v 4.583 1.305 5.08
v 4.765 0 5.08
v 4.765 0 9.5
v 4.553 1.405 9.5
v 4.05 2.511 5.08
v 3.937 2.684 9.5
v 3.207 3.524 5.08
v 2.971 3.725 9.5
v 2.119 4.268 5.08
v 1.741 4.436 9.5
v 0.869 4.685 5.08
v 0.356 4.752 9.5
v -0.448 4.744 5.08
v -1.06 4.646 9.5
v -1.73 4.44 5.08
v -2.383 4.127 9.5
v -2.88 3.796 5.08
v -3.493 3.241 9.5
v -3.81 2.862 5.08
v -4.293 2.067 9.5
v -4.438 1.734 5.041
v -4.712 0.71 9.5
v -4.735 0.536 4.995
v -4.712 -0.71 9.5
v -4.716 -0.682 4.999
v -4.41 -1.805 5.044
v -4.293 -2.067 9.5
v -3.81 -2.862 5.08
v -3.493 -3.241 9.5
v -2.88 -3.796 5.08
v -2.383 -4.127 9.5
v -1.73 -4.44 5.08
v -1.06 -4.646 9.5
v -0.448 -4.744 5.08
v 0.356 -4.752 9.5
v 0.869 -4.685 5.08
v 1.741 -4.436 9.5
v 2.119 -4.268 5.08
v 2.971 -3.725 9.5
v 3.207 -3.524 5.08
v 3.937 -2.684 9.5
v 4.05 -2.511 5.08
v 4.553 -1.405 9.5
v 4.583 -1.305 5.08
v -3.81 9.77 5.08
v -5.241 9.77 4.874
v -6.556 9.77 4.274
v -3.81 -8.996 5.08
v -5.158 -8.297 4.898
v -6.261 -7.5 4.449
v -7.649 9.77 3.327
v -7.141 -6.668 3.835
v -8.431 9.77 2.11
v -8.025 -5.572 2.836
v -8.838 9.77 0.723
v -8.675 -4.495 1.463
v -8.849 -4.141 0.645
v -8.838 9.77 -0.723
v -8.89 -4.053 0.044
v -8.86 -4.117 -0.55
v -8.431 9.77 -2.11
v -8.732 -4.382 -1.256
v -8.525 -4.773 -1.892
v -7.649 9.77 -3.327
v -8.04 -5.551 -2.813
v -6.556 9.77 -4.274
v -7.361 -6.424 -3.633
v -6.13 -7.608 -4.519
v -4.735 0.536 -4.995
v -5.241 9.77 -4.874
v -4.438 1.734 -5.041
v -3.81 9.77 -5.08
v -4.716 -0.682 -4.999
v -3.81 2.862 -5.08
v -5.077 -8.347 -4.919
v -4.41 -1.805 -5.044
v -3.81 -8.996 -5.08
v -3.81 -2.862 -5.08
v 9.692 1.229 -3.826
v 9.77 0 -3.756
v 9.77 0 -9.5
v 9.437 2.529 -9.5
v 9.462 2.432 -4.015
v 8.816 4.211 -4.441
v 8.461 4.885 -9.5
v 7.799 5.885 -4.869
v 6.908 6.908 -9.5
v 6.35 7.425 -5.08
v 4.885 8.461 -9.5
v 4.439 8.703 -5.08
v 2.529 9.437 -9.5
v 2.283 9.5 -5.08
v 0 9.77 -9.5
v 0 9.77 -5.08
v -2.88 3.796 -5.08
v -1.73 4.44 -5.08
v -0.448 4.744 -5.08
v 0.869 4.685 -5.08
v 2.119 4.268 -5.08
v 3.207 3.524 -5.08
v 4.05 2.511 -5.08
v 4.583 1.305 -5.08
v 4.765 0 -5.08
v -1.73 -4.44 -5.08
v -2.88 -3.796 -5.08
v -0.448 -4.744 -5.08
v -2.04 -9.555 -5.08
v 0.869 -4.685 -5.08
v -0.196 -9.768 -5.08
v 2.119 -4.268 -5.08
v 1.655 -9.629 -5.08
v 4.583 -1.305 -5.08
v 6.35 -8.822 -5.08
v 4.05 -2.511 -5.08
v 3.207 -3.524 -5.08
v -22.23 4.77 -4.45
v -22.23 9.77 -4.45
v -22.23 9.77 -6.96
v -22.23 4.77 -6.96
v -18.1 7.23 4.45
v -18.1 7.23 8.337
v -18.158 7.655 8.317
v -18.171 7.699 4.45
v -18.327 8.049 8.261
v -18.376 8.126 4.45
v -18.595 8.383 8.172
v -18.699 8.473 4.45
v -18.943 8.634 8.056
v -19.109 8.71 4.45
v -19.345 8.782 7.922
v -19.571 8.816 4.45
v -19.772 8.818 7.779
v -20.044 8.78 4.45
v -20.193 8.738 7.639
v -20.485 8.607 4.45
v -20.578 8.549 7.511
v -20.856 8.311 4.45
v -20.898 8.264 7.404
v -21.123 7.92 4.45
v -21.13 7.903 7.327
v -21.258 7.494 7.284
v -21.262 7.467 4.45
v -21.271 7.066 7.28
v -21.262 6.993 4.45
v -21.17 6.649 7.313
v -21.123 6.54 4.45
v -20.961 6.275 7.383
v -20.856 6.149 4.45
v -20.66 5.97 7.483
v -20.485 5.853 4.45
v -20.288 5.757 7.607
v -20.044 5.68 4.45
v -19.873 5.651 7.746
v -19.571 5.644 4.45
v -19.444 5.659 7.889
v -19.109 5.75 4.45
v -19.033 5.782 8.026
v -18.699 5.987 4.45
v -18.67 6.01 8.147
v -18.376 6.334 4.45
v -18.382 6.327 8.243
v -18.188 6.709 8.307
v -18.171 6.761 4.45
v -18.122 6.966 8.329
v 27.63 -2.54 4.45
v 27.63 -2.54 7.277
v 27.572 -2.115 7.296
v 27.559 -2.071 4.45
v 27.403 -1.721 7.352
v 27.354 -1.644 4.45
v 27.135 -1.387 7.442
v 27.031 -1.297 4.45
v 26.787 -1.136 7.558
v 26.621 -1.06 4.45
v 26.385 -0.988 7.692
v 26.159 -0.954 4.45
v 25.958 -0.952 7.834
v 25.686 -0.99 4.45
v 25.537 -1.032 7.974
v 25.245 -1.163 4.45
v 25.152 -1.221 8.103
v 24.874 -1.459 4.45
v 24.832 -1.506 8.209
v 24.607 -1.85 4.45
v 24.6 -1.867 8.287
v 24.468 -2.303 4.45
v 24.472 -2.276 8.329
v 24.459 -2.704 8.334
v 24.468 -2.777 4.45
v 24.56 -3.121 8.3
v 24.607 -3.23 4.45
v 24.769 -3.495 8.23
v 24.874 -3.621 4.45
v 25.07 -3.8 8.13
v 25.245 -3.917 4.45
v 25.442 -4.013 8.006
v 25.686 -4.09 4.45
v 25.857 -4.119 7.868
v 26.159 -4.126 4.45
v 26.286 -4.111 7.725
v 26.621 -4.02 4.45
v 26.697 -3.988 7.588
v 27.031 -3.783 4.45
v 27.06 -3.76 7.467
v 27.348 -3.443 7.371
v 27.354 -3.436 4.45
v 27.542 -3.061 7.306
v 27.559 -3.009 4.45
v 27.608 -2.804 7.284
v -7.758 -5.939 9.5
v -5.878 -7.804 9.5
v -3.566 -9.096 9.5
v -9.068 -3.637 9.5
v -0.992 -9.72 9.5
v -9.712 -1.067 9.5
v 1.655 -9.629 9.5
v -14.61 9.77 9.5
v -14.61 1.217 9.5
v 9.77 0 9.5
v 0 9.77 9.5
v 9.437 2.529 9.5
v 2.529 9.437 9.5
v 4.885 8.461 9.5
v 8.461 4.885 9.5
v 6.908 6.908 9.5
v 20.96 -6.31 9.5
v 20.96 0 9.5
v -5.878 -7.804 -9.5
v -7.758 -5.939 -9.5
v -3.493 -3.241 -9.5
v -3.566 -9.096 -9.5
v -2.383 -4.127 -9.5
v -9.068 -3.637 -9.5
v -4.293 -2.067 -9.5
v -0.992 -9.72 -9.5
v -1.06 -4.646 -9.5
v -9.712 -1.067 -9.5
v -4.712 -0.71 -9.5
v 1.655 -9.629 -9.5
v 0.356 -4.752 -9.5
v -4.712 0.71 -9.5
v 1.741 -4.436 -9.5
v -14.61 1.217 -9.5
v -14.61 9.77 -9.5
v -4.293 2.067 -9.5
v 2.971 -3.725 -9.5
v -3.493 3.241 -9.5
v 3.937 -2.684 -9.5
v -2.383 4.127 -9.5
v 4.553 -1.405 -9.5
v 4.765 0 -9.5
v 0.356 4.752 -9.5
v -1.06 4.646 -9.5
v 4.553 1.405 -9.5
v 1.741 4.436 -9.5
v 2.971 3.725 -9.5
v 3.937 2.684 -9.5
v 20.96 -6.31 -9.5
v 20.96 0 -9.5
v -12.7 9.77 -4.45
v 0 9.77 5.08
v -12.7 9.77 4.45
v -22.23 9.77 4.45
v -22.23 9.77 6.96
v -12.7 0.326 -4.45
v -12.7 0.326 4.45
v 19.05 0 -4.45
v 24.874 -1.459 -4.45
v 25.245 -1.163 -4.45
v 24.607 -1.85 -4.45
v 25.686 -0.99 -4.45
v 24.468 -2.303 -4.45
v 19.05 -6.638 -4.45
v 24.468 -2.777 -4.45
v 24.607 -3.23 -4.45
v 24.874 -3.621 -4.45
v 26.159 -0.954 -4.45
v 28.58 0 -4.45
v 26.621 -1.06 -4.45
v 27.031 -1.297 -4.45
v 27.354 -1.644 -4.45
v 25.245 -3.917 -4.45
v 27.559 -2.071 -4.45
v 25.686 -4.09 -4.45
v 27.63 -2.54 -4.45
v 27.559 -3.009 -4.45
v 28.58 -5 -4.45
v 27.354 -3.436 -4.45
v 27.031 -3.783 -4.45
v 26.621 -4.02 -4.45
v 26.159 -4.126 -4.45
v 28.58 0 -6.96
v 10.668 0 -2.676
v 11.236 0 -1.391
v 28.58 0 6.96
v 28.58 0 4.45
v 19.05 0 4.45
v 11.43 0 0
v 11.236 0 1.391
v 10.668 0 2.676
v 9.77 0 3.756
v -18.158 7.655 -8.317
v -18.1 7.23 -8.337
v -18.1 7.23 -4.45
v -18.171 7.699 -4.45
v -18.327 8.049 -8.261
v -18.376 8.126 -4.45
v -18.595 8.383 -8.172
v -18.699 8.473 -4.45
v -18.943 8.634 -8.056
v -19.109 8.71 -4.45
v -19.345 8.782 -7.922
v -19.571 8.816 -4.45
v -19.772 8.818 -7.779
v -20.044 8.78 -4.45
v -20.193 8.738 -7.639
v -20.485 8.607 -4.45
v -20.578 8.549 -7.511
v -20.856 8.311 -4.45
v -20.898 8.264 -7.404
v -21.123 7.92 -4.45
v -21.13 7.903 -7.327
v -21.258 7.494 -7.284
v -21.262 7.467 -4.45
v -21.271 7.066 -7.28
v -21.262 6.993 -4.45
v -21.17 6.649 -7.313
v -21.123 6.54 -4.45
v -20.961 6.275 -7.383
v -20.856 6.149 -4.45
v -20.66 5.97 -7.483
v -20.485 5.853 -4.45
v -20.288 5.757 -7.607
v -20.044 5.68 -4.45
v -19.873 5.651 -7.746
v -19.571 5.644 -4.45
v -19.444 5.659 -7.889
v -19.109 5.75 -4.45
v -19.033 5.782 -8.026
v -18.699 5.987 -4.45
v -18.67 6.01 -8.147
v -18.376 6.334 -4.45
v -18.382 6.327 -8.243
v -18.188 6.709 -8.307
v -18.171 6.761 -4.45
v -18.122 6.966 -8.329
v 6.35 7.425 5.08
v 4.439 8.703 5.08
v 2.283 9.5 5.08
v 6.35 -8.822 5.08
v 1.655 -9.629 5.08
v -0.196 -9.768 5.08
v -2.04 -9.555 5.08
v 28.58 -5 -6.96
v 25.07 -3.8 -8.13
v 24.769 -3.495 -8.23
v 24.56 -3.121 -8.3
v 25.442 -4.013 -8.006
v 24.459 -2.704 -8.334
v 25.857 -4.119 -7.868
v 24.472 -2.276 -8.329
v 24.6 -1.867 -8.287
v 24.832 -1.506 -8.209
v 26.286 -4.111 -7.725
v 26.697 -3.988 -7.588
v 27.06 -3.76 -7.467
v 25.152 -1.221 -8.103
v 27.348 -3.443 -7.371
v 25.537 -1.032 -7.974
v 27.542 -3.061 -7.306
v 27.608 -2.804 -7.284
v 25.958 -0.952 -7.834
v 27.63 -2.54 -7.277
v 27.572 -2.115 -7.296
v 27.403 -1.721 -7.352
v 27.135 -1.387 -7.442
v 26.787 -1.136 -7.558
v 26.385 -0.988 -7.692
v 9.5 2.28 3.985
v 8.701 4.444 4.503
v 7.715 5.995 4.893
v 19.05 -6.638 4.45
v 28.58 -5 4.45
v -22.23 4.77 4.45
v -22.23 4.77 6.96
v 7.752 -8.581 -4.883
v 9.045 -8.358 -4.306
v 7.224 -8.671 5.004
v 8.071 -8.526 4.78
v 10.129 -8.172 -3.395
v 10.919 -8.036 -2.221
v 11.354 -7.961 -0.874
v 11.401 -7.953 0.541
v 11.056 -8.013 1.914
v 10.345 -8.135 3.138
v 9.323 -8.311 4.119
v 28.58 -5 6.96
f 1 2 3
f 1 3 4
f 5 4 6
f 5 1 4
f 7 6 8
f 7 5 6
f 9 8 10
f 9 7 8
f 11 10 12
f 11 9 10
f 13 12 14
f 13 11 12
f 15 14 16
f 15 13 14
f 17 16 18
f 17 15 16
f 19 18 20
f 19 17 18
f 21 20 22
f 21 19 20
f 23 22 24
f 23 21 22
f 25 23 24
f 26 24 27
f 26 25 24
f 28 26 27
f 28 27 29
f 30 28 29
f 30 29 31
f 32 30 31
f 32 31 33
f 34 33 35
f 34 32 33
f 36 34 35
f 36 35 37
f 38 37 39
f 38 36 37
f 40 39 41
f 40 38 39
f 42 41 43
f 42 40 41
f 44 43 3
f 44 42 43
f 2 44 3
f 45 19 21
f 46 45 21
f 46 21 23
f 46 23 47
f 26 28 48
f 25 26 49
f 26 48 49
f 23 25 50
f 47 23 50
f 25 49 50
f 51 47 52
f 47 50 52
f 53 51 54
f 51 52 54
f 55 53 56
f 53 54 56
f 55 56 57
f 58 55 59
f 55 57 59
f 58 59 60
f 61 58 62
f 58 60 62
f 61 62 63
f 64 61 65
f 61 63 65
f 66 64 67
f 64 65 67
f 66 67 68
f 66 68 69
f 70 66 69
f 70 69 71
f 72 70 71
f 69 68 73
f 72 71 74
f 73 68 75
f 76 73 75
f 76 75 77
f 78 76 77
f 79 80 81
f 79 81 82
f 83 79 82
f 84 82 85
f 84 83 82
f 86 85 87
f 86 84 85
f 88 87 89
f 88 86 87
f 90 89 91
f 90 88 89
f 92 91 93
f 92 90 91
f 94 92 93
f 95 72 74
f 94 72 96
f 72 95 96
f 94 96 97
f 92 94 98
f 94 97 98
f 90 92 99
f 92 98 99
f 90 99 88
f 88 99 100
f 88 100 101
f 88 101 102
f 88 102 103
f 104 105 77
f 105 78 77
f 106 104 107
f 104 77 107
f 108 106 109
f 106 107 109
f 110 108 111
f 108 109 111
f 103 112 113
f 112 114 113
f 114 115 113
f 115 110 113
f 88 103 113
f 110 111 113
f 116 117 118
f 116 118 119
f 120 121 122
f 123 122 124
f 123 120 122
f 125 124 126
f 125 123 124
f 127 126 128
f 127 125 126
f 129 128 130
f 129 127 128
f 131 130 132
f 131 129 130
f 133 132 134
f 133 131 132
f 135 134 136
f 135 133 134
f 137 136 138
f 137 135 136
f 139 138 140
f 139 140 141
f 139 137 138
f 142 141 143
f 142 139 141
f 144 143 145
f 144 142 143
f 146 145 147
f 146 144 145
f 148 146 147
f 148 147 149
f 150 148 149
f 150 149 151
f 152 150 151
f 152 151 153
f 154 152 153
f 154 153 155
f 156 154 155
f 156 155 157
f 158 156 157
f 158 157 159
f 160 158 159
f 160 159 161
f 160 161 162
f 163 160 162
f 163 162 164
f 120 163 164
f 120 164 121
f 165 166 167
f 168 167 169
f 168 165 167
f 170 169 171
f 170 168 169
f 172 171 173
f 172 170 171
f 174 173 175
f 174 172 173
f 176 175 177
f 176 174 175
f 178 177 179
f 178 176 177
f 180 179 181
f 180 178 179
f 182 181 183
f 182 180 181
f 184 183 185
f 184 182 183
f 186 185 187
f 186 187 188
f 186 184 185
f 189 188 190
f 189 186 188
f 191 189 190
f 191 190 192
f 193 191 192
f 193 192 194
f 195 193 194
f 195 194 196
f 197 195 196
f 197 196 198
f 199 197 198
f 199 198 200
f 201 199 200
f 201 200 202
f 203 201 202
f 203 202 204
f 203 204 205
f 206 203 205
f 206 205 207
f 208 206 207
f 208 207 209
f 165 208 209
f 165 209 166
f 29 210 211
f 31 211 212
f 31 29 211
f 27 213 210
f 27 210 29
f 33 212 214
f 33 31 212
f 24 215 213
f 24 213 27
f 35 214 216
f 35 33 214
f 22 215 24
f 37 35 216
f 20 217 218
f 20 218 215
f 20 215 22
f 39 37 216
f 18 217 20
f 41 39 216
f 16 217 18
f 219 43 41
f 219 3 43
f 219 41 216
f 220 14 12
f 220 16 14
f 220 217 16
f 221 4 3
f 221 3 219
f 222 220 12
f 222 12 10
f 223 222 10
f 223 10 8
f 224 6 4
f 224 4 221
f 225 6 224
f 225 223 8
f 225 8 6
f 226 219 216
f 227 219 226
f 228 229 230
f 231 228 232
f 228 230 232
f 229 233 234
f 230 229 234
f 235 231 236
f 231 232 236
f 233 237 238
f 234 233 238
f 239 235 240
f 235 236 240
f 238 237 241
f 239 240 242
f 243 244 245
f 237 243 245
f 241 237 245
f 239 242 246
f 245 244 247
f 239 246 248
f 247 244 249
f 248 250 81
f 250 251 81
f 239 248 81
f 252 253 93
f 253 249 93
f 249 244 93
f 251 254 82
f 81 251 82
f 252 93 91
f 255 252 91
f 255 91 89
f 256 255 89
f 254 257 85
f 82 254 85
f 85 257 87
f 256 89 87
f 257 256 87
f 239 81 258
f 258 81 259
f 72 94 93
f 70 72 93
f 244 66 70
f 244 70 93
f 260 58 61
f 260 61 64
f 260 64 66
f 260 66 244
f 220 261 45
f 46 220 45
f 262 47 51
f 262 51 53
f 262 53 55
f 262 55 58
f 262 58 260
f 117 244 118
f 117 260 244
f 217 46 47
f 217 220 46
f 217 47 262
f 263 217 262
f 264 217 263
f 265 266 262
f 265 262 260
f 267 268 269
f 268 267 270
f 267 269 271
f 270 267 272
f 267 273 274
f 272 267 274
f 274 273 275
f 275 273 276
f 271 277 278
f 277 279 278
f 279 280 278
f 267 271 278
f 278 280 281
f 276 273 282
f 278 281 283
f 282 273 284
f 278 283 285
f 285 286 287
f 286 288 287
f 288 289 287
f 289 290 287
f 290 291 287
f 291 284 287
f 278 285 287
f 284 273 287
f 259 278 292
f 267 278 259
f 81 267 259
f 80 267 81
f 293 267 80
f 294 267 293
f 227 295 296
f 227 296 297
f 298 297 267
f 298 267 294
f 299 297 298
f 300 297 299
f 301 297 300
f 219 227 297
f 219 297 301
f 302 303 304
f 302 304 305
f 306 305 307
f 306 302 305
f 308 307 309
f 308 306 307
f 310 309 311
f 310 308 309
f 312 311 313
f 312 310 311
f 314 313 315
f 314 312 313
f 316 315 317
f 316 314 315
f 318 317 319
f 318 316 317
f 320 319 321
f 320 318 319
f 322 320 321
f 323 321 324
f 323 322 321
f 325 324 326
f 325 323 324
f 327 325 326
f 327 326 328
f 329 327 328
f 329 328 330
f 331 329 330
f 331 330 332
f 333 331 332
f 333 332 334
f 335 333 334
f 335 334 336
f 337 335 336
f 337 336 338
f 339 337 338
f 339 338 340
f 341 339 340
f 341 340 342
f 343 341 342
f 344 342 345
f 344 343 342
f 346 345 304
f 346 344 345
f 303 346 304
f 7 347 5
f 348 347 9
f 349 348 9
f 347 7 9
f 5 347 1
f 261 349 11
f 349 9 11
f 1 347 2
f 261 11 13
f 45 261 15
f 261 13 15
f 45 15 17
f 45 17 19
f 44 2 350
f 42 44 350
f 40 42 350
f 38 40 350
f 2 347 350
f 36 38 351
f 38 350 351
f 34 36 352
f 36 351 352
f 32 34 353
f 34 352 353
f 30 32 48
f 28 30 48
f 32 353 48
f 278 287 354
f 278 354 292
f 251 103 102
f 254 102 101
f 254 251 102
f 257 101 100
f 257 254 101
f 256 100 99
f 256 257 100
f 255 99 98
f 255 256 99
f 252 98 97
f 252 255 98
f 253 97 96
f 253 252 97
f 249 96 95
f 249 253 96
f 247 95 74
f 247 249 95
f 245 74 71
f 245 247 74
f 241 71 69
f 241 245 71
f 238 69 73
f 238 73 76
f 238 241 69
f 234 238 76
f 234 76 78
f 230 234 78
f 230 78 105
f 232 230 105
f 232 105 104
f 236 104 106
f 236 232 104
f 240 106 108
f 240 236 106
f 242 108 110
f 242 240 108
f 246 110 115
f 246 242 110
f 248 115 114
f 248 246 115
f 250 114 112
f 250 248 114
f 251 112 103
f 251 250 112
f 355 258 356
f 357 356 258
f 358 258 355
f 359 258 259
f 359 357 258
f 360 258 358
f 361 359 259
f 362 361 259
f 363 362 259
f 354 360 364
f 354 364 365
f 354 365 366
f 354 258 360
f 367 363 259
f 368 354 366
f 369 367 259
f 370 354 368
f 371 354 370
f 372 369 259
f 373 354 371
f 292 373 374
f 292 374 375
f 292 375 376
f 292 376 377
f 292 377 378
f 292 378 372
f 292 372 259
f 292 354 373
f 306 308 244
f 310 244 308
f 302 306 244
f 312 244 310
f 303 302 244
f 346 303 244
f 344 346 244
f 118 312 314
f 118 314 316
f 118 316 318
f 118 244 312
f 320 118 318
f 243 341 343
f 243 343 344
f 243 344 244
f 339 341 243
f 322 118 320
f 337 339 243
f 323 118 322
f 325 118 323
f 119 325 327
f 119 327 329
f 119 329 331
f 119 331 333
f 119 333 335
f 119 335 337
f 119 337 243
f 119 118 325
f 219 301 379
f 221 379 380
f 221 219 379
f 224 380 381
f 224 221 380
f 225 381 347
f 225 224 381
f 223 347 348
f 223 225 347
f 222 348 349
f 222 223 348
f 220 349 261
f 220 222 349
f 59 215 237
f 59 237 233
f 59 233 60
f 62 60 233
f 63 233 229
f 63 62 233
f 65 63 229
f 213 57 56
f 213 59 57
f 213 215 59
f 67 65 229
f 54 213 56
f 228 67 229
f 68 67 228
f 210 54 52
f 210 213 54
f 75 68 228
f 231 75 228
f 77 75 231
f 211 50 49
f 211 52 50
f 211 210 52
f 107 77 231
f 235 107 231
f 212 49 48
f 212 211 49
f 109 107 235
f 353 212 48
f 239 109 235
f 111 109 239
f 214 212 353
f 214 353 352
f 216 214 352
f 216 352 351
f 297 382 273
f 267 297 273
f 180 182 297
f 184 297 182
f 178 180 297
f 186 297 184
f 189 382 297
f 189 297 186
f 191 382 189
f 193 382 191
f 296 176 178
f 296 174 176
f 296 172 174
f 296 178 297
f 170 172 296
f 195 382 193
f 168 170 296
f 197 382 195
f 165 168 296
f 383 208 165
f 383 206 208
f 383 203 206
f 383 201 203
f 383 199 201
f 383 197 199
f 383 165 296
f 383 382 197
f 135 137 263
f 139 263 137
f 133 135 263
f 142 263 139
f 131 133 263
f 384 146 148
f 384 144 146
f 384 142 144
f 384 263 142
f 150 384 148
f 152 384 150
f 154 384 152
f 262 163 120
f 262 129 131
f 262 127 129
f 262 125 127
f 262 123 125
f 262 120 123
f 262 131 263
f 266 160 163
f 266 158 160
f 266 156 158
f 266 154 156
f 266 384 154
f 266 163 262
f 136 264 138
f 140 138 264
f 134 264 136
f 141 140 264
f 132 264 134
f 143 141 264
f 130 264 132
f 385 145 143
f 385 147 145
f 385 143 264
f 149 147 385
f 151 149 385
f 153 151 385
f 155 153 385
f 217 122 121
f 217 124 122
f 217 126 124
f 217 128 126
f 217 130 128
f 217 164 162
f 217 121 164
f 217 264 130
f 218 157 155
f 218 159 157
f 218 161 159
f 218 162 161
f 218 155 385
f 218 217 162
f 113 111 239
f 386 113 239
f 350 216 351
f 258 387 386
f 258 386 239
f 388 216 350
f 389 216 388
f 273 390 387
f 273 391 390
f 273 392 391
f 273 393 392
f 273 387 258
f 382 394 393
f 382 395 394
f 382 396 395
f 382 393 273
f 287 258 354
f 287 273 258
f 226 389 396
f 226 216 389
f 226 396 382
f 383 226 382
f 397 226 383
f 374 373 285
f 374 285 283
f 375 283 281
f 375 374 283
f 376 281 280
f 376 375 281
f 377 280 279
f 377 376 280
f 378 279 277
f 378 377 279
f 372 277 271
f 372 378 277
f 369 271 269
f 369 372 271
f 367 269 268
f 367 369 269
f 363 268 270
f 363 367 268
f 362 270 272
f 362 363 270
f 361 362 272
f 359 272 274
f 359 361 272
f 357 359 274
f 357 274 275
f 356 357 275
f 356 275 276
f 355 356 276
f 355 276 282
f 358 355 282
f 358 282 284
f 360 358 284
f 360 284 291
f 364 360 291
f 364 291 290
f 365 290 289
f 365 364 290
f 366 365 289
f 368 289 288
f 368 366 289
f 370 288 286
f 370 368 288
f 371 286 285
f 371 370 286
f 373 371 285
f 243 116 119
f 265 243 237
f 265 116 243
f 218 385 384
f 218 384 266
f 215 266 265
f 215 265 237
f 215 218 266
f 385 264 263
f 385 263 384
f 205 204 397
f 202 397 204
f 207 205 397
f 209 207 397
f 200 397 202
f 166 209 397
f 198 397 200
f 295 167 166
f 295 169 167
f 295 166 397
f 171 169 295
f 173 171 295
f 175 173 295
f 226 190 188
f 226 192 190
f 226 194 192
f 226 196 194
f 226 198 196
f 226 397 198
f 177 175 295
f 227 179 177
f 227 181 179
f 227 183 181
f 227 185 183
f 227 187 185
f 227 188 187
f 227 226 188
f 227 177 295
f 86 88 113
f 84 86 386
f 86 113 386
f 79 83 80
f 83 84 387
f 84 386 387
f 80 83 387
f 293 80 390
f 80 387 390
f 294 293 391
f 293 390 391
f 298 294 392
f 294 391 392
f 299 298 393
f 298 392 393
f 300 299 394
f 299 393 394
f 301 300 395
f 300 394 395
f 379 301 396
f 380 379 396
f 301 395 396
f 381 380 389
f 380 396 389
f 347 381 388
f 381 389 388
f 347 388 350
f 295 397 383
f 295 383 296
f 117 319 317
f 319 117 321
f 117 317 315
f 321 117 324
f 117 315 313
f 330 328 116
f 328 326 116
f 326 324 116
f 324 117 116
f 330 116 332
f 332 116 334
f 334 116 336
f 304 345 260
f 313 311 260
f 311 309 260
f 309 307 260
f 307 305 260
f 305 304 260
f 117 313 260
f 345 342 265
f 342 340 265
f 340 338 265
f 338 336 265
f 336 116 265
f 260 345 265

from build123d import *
from OCP.BRepFilletAPI import BRepFilletAPI_MakeChamfer

# Parameters (mm, degrees)
SKETCH1_R               = 4.765
BOSS_EXTRUDE1_DEPTH     = 9.5
CHAMFER1_SIZE           = 7.62
CHAMFER1_SIZE2          = 2.54
CHAMFER2_SIZE           = 2.54
CHAMFER2_SIZE2          = 7.62
CUT_EXTRUDE1_DEPTH      = 32.662585176
CUT_EXTRUDE1_DEPTH_BACK = 32.662585176
SKETCH2_W               = 9.53
SKETCH2_H               = 8.9
CUT_EXTRUDE2_DEPTH      = 32.662585176
CUT_EXTRUDE2_DEPTH_BACK = 32.662585176
CUT_EXTRUDE3_DEPTH      = 32.662585236
CUT_EXTRUDE3_DEPTH_BACK = 32.662585236
SKETCH4_R               = 1.59


with BuildPart() as part:
    # Sketch1 → Boss-Extrude1 (new, symmetric)
    with BuildSketch(Plane.XY):
        with BuildLine():
            Line((0, 9.77), (-22.23, 9.77))
            Line((-22.23, 9.77), (-22.23, 4.77))
            Line((-22.23, 4.77), (-9.711509246, -1.067468107))
            ThreePointArc((-9.711509246, -1.067468107), (-5.877874817, -7.804068659), (1.655323868, -9.628748771))
            Line((1.655323868, -9.628748771), (28.58, -5))
            Line((28.58, -5), (28.58, 0))
            Line((28.58, 0), (9.77, 0))
            ThreePointArc((9.77, 0), (6.908433252, 6.908433252), (0, 9.77))
        make_face()
        Circle(SKETCH1_R, mode=Mode.SUBTRACT)
    extrude(amount=BOSS_EXTRUDE1_DEPTH, both=True)

    # Chamfer1
    chamfer1_edges = [part.edges().sort_by_distance(p)[0] for p in [
        (-22.23, 7.27, -9.5),
        (28.58, -2.5, -9.5),
    ]]
    chamfer1_side = [part.faces().sort_by_distance(p)[0] for p in [
        (-11.115, 9.225622585, -9.5),
    ]]
    chamfer(chamfer1_edges, length=CHAMFER1_SIZE, length2=CHAMFER1_SIZE2, reference=chamfer1_side[0])

    # Chamfer2: one chamfer whose edges measure the first distance from different faces: ONE call of the kernel's chamfer builder (chamfer() names one face for all edges)
    chamfer2_edges_1 = [part.edges().sort_by_distance(p)[0] for p in [
        (-22.23, 7.27, 9.5),
    ]]
    chamfer2_side_1 = [part.faces().sort_by_distance(p)[0] for p in [
        (-22.23, 7.27, 1.27),
    ]]
    chamfer2_edges_2 = [part.edges().sort_by_distance(p)[0] for p in [
        (28.58, -2.5, 9.5),
    ]]
    chamfer2_side_2 = [part.faces().sort_by_distance(p)[0] for p in [
        (28.58, -2.5, 1.27),
    ]]
    chamfer2 = BRepFilletAPI_MakeChamfer(part.part.solid().wrapped)
    for e in chamfer2_edges_1:
        chamfer2.Add(CHAMFER2_SIZE, CHAMFER2_SIZE2, e.wrapped, chamfer2_side_1[0].wrapped)  # the first distance lies on this face
    for e in chamfer2_edges_2:
        chamfer2.Add(CHAMFER2_SIZE, CHAMFER2_SIZE2, e.wrapped, chamfer2_side_2[0].wrapped)  # the first distance lies on this face
    add(Compound.cast(chamfer2.Shape()), mode=Mode.REPLACE)

    # Sketch2 → Cut-Extrude1 (cut, two sides: drawn at the far end of the back side and taken through both)
    with BuildSketch(Plane(origin=(0, 0, 0), x_dir=(1, 0, 0), z_dir=(0, 1, 0)).offset(-CUT_EXTRUDE1_DEPTH_BACK)):
        with Locations((-17.465, 0)):
            Rectangle(SKETCH2_W, SKETCH2_H)
        with Locations((23.815, 0)):
            Rectangle(SKETCH2_W, SKETCH2_H)
    extrude(amount=CUT_EXTRUDE1_DEPTH + CUT_EXTRUDE1_DEPTH_BACK, mode=Mode.SUBTRACT)

    # Sketch3 → Cut-Extrude2 (cut, two sides: drawn at the far end of the back side and taken through both)
    with BuildSketch(Plane(origin=(0, 0, 0), x_dir=(1, 0, 0), z_dir=(0, 1, 0)).offset(-CUT_EXTRUDE2_DEPTH_BACK)):
        with BuildLine():
            Line((-3.81, 5.08), (6.35, 5.08))
            ThreePointArc((6.35, 5.08), (11.43, 0), (6.35, -5.08))
            Line((6.35, -5.08), (-3.81, -5.08))
            ThreePointArc((-3.81, -5.08), (-8.89, 0), (-3.81, 5.08))
        make_face()
    extrude(amount=CUT_EXTRUDE2_DEPTH + CUT_EXTRUDE2_DEPTH_BACK, mode=Mode.SUBTRACT)

    # Sketch4 → Cut-Extrude3 (cut, two sides: drawn at the far end of the back side and taken through both)
    with BuildSketch(Plane.XY.offset(-CUT_EXTRUDE3_DEPTH_BACK)):
        with Locations((-19.69, 7.23)):
            Circle(SKETCH4_R)
        with Locations((26.04, -2.54)):
            Circle(SKETCH4_R)
    extrude(amount=CUT_EXTRUDE3_DEPTH + CUT_EXTRUDE3_DEPTH_BACK, mode=Mode.SUBTRACT)


solid = part.part
